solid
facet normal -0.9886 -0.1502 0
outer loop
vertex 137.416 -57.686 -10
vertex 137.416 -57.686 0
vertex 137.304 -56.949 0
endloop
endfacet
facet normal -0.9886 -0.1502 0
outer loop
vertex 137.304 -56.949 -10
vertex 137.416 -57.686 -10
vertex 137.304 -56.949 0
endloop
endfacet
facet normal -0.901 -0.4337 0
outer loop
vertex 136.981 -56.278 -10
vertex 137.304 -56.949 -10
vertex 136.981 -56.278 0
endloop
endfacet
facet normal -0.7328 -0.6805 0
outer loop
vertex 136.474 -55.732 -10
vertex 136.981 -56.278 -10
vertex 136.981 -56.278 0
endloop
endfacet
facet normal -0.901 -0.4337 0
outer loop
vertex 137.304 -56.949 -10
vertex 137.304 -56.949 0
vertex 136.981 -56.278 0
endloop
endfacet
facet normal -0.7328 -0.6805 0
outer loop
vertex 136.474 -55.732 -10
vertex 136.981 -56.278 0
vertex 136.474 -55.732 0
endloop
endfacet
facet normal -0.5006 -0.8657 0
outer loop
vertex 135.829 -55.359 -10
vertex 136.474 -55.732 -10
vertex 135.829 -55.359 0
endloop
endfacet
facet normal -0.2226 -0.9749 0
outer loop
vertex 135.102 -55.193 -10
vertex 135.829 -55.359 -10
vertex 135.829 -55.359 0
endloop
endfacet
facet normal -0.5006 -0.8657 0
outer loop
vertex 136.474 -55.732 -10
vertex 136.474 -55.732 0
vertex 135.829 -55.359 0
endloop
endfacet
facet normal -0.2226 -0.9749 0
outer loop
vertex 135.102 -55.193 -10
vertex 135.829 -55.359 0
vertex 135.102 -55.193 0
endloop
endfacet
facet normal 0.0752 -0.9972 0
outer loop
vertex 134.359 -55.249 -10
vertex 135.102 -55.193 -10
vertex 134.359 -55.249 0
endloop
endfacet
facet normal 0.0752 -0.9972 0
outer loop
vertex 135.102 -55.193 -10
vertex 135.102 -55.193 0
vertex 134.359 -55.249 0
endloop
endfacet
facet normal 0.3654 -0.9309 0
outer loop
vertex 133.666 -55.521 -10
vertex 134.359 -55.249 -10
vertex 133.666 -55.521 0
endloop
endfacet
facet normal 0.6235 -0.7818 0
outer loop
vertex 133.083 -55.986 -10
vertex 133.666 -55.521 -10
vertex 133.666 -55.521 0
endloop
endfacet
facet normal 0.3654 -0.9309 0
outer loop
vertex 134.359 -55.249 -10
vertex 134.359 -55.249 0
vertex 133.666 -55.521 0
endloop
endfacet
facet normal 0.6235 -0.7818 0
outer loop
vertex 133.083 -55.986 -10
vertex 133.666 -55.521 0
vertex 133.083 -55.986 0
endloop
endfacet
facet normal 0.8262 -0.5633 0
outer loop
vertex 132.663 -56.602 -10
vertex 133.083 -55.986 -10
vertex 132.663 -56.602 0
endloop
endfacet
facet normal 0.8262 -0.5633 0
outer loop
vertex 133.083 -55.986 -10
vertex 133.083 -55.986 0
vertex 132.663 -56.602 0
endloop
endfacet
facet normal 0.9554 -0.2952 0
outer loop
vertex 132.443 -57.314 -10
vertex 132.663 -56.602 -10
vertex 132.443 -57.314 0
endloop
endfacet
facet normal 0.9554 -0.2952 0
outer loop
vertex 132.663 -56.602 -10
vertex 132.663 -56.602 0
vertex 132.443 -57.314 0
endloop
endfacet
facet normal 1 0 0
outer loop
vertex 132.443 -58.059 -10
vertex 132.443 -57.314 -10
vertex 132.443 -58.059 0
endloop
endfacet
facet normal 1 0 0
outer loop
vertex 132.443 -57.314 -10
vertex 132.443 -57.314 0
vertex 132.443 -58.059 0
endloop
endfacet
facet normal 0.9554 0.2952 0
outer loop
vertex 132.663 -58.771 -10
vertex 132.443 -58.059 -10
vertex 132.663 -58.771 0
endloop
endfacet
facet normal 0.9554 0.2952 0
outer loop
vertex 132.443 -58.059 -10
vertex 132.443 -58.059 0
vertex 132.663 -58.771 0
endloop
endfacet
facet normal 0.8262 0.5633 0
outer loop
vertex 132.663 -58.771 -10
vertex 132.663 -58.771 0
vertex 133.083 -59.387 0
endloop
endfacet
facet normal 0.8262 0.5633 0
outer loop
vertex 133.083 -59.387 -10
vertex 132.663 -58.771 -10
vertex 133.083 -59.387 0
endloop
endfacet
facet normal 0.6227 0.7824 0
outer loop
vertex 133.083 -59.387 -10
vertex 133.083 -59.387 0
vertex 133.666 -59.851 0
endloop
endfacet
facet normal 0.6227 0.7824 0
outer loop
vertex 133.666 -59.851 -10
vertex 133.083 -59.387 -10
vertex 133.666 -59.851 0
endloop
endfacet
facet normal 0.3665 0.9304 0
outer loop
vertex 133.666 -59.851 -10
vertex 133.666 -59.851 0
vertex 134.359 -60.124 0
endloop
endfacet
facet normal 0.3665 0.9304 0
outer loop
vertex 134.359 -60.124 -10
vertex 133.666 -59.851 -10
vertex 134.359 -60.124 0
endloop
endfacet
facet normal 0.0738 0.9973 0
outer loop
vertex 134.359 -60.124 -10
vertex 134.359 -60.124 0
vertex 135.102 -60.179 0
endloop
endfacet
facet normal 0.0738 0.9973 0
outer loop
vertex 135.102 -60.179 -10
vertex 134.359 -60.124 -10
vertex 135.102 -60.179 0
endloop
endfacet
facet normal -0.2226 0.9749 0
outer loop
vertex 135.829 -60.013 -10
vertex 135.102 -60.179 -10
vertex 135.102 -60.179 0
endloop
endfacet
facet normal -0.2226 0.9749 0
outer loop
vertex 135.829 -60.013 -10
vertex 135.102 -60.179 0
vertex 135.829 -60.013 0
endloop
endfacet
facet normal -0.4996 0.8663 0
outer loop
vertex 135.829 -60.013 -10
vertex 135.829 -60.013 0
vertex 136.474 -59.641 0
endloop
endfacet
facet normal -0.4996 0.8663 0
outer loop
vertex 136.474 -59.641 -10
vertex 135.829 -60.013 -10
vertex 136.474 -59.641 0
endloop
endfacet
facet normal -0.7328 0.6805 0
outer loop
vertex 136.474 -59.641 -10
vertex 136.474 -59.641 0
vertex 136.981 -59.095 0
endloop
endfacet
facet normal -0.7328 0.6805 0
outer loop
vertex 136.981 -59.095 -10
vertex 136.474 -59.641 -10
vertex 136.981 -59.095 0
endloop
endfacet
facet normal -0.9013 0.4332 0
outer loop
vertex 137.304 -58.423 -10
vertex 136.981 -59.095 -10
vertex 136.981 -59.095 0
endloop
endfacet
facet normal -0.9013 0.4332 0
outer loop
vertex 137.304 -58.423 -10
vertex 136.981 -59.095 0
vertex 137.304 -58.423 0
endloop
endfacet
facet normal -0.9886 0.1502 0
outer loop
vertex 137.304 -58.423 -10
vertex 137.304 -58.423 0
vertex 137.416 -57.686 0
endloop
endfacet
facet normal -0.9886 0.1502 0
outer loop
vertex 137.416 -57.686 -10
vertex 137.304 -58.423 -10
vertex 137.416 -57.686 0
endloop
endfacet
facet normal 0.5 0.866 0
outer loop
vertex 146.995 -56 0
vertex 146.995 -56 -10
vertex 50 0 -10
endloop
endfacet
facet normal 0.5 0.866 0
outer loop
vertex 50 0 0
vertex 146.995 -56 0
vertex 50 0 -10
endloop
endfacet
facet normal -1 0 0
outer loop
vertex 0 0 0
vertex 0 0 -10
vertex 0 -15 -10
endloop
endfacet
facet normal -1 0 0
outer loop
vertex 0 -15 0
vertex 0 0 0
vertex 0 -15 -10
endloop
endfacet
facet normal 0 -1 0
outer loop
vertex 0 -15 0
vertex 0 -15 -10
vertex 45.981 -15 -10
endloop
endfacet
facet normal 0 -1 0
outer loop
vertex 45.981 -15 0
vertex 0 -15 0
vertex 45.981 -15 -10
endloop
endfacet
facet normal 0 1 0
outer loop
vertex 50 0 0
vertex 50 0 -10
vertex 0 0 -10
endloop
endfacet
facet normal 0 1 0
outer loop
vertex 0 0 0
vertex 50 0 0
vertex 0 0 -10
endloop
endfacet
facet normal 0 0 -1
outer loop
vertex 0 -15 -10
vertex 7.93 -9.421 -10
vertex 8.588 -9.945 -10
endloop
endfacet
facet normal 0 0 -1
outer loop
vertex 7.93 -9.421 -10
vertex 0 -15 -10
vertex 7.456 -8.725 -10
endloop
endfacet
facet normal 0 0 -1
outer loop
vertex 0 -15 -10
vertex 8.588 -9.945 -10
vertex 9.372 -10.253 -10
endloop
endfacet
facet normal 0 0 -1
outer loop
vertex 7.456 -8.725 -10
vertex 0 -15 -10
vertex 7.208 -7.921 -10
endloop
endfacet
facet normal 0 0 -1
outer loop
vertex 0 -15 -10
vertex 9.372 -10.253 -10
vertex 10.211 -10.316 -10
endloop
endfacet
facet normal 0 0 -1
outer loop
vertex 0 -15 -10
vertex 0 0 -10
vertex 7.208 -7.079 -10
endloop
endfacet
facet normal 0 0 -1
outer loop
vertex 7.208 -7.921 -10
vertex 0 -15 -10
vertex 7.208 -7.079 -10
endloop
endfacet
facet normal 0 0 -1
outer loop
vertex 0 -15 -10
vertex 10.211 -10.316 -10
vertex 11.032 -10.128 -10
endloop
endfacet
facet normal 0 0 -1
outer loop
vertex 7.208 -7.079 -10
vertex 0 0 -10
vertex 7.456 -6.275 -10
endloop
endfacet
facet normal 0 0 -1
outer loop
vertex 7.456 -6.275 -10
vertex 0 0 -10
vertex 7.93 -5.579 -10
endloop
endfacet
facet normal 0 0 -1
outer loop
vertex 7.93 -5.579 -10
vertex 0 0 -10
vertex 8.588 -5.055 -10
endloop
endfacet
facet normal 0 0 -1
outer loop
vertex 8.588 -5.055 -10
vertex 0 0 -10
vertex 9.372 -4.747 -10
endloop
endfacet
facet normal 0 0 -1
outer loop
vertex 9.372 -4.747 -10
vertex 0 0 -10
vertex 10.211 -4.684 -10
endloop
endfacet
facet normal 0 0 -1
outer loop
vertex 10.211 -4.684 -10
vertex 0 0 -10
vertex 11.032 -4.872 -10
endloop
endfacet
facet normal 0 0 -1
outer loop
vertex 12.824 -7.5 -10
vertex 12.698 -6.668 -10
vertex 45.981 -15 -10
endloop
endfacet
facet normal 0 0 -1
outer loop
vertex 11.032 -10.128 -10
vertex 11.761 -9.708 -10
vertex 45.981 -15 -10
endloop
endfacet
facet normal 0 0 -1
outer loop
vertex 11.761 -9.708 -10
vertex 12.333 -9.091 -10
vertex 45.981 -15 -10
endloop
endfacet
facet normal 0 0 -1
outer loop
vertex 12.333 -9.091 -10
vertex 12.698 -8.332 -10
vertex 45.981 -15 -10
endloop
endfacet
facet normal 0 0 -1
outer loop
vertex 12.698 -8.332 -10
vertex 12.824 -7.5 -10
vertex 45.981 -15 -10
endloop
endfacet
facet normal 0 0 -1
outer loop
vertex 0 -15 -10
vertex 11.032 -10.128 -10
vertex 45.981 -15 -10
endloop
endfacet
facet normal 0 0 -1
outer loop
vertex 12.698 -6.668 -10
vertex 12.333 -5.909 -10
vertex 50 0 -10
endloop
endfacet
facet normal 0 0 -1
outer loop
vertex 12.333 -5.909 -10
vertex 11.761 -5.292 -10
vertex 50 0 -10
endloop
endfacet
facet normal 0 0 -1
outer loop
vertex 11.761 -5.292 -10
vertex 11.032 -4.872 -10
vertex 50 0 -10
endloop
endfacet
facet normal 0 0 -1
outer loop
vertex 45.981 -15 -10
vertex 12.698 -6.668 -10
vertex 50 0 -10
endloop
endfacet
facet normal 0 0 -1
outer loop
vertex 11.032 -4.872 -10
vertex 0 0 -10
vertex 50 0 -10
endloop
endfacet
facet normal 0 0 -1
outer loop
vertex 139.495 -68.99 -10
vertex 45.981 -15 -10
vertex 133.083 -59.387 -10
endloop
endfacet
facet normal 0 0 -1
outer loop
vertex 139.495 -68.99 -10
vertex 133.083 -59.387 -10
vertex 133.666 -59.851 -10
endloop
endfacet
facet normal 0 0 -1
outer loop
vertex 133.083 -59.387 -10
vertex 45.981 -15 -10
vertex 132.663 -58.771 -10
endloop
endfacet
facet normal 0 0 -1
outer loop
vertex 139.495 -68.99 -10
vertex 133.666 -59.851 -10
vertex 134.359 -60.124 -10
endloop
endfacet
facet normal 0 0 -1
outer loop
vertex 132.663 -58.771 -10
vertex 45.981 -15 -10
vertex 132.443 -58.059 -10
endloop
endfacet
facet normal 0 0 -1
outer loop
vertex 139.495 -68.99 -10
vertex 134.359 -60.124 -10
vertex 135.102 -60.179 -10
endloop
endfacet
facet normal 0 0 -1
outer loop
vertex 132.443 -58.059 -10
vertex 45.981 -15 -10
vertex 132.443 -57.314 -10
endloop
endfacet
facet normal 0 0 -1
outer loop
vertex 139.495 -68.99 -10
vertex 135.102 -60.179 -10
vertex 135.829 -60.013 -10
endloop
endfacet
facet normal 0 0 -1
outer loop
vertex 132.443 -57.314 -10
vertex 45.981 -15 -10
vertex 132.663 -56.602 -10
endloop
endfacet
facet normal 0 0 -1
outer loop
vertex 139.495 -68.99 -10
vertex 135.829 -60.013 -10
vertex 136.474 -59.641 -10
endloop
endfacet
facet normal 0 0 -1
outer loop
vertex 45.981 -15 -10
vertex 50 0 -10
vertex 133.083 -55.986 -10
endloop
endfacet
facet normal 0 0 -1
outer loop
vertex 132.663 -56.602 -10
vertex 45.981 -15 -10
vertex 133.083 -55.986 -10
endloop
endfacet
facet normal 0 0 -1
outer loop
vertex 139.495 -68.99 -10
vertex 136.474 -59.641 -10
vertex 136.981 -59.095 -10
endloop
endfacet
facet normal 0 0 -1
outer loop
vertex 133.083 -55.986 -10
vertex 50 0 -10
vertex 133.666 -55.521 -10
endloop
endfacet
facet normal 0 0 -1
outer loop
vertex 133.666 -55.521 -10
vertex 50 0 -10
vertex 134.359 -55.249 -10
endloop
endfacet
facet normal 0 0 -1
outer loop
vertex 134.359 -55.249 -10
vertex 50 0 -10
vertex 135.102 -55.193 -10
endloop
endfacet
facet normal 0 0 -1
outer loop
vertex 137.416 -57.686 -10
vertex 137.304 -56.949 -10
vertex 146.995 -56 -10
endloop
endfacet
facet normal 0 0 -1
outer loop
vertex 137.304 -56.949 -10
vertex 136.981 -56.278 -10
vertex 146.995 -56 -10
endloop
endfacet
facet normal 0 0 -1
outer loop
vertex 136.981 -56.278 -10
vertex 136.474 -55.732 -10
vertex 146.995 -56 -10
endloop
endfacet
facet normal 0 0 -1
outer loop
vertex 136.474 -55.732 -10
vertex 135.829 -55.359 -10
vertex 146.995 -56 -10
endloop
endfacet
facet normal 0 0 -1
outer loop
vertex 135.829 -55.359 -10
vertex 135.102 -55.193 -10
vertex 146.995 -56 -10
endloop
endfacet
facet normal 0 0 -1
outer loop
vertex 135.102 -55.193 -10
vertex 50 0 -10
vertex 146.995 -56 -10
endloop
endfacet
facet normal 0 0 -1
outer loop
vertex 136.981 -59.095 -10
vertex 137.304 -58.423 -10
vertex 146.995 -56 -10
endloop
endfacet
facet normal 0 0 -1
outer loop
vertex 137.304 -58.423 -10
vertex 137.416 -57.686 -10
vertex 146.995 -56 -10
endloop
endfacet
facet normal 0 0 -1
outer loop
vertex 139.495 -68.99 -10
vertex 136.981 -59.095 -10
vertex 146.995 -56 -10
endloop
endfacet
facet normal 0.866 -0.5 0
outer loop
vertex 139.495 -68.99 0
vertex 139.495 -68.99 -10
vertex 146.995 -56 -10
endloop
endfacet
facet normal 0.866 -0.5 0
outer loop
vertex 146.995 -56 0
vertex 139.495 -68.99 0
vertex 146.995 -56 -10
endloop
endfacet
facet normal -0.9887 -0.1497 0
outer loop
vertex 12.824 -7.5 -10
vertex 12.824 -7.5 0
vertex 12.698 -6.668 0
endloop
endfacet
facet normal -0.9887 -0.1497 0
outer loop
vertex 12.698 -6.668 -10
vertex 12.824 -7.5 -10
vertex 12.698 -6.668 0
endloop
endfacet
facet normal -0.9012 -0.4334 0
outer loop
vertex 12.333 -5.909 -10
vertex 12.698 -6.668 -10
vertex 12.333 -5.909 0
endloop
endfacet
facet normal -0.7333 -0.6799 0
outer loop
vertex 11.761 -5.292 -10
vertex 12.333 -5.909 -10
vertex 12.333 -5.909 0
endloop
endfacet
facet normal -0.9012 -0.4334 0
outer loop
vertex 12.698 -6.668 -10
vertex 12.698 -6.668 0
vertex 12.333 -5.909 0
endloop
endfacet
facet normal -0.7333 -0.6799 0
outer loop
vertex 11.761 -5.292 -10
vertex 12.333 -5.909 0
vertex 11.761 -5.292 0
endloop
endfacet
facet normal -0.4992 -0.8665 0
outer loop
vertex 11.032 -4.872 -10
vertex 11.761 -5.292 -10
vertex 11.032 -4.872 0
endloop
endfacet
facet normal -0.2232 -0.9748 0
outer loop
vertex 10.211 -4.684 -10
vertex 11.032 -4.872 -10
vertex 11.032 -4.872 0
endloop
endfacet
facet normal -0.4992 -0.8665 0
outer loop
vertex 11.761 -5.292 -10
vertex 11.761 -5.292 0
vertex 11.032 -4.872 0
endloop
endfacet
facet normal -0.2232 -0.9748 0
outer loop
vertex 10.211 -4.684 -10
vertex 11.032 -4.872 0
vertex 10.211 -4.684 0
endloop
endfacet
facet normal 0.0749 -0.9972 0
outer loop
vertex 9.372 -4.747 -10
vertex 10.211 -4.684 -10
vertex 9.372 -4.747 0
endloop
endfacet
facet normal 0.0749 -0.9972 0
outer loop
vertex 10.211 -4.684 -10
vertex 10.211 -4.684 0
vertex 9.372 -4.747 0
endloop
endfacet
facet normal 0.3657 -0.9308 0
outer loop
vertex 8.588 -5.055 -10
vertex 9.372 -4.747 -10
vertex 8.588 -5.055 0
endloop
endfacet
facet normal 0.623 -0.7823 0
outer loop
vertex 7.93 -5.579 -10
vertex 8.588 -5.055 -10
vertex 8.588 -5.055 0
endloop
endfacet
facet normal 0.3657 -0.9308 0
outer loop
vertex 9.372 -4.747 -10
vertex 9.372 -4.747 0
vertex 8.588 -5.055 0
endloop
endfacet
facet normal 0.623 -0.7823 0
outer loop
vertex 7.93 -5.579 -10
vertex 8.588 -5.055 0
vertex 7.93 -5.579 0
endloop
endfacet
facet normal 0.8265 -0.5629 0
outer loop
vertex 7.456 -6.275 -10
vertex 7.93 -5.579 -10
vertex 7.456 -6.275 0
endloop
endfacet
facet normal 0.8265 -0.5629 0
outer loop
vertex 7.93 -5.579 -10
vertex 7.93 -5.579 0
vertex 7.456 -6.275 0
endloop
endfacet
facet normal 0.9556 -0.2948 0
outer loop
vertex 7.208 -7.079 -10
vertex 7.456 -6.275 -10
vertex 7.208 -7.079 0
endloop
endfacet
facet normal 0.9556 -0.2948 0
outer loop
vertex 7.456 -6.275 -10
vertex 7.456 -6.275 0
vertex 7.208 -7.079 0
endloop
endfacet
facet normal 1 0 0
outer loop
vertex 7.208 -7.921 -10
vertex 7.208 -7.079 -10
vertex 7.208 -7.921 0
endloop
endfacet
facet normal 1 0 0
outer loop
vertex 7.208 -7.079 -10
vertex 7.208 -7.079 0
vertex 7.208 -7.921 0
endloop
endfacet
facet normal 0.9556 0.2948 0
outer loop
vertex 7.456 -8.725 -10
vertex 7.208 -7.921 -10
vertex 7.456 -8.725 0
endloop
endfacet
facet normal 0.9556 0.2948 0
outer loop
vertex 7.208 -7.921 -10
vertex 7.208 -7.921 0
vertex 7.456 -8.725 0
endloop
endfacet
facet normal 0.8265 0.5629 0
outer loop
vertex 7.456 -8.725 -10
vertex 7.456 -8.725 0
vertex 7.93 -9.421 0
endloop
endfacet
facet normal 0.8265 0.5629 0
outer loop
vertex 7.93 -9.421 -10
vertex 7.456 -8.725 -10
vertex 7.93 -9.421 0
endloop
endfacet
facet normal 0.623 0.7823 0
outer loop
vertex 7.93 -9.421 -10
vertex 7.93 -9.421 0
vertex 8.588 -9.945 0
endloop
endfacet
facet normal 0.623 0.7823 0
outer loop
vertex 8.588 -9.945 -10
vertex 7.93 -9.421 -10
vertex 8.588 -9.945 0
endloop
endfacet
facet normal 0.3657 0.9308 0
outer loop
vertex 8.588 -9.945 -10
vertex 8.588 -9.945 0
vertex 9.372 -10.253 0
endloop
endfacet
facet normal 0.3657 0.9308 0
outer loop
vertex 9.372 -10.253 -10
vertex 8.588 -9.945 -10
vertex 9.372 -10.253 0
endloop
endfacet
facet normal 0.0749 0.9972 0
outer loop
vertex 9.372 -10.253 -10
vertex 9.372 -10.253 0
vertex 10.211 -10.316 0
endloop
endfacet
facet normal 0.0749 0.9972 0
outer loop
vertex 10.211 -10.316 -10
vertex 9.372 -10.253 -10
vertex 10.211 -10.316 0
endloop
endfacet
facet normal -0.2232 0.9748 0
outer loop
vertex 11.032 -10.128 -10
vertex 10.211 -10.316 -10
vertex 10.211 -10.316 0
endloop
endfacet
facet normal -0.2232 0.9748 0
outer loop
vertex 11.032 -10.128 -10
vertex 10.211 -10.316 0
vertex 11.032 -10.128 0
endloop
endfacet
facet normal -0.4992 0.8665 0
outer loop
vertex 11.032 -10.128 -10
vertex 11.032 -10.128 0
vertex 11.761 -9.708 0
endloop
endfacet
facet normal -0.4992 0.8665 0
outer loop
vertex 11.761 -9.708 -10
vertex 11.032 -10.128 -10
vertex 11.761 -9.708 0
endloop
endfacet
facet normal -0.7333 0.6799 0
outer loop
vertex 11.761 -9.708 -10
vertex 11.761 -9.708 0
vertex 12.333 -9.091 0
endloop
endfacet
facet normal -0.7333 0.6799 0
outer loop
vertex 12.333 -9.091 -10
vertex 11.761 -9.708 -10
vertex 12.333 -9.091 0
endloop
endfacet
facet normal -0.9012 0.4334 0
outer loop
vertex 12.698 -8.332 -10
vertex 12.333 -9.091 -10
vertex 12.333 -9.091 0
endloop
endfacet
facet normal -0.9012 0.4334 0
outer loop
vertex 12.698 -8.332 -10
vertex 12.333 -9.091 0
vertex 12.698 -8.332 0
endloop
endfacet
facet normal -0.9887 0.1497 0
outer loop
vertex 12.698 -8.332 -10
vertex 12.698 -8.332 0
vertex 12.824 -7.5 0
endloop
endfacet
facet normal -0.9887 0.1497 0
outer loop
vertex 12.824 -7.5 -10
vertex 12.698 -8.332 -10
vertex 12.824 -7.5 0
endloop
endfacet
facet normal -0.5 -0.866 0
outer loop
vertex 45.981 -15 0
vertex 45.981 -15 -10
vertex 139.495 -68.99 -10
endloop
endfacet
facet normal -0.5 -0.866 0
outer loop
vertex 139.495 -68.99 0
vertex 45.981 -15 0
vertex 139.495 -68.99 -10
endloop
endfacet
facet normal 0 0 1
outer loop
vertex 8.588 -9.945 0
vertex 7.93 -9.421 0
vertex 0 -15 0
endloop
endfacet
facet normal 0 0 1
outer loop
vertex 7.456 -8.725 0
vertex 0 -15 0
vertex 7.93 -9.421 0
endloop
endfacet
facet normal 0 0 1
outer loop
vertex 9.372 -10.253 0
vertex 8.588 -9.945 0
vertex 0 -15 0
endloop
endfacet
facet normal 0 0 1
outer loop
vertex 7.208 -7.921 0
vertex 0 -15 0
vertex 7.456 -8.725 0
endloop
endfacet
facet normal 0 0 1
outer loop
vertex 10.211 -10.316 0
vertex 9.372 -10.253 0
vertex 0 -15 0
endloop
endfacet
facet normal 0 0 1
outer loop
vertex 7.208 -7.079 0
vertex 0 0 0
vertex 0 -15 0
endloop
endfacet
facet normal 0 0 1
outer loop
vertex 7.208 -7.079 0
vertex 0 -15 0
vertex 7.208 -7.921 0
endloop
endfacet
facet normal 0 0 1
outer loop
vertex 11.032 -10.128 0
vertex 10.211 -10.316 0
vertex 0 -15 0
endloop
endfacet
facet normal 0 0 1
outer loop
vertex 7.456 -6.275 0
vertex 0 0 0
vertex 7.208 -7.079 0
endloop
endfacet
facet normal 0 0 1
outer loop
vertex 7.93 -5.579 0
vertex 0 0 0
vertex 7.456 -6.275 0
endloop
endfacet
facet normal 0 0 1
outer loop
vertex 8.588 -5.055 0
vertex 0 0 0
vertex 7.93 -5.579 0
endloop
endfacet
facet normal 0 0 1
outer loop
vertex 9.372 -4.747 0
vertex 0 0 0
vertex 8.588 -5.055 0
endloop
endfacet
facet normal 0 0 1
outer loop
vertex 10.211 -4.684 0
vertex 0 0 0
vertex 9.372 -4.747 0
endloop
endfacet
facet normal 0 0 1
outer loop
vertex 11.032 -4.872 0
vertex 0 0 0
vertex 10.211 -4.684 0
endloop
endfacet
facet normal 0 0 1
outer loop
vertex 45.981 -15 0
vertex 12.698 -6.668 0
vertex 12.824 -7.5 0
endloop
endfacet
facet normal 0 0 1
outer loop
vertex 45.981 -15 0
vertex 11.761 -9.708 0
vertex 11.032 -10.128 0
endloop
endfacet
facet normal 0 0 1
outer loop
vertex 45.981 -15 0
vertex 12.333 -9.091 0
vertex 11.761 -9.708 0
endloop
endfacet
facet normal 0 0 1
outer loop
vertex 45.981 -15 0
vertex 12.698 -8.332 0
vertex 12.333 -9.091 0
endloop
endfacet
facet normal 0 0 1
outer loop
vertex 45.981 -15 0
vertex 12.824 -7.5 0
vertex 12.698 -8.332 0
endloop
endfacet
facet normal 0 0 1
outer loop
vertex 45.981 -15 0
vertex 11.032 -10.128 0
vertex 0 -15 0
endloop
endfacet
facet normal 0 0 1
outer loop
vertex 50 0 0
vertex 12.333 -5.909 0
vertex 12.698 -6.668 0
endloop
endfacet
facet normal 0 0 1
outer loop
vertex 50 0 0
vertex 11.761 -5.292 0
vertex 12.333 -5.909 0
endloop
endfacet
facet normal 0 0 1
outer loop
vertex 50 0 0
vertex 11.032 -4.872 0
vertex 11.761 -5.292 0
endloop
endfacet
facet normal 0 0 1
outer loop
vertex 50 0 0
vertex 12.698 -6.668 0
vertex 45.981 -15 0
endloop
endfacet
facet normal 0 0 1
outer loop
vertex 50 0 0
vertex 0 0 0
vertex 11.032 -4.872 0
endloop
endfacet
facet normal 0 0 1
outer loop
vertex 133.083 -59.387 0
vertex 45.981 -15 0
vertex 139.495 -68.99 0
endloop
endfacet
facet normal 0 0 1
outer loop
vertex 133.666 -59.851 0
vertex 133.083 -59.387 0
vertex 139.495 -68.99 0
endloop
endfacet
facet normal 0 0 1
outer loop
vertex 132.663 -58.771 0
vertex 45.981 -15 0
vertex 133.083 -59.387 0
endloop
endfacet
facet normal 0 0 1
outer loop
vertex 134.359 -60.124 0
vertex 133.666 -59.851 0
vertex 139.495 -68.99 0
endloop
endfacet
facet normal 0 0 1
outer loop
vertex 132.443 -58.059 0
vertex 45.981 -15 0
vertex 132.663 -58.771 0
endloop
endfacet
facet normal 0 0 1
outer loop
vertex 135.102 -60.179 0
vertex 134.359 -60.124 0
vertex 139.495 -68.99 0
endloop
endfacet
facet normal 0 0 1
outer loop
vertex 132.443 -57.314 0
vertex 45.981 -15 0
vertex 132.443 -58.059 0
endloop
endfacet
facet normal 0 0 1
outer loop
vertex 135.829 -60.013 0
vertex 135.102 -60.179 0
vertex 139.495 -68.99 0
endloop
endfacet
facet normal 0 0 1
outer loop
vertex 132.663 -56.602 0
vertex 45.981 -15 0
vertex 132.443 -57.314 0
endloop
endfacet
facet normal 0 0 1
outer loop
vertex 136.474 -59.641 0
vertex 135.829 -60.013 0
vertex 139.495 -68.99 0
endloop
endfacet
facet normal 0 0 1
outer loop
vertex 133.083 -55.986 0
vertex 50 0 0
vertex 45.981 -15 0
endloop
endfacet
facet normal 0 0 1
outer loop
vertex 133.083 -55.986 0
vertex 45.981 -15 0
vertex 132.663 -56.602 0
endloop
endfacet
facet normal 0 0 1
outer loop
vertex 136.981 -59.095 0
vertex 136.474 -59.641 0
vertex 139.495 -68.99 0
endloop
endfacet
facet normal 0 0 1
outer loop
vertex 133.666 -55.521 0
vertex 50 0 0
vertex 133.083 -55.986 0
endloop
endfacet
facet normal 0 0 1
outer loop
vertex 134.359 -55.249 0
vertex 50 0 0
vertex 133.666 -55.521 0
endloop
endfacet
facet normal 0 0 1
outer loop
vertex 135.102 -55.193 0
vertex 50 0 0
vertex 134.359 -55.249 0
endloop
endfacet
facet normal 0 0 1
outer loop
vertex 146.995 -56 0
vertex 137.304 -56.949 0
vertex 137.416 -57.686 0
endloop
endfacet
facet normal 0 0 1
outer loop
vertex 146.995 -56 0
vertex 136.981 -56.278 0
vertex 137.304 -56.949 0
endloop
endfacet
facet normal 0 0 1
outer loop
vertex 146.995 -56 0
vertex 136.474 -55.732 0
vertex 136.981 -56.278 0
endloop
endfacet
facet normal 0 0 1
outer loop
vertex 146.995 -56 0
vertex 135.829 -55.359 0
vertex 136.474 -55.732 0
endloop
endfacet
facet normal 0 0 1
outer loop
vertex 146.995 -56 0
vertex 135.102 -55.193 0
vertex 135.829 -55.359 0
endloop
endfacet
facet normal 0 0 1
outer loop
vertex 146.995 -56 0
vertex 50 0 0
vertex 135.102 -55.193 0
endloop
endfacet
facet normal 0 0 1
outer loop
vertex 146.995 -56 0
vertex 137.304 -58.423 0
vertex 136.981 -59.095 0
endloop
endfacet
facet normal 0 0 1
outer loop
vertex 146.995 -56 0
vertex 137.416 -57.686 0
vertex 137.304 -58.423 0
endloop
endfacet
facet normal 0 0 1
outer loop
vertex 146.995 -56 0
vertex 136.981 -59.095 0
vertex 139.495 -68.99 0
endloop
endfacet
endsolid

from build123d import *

# Parameters (mm, degrees)
BASE_FLANGE1_START = -10
BASE_FLANGE1_DEPTH = 10
CUT_EXTRUDE1_REACH = 164.687
SKETCH6_R          = 2.823671173
SKETCH6_R_2        = 2.5


# Read off the part's stored shape, not the designer's step: Base-Flange1
with BuildPart() as part:
    # Base-Flange1 outline → Base-Flange1 (new body)
    with BuildSketch(Plane.XY.offset(BASE_FLANGE1_START)):
        Polygon((50, 0), (0, 0), (0, -15), (45.980762114, -15), (139.494845224, -68.990381057), (146.994845224, -56), align=None)
    extrude(amount=BASE_FLANGE1_DEPTH)

    # Sketch6 → Cut-Extrude1 (cut, up to next)
    with BuildSketch(Plane.XY, mode=Mode.PRIVATE) as cut_extrude1_sk1:
        with Locations((10, -7.5)):
            Circle(SKETCH6_R)
    cut_extrude1_tool1 = extrude(cut_extrude1_sk1.sketch, amount=-CUT_EXTRUDE1_REACH, mode=Mode.PRIVATE) & part.part
    # Sketch6 → Cut-Extrude1 (cut, up to next)
    with BuildSketch(Plane.XY, mode=Mode.PRIVATE) as cut_extrude1_sk2:
        with Locations((134.915511346, -57.686247372)):
            Circle(SKETCH6_R_2)
    cut_extrude1_tool2 = extrude(cut_extrude1_sk2.sketch, amount=-CUT_EXTRUDE1_REACH, mode=Mode.PRIVATE) & part.part
    add(cut_extrude1_tool1.solids().sort_by_distance((10, -7.5, 0))[0], mode=Mode.SUBTRACT)
    add(cut_extrude1_tool2.solids().sort_by_distance((134.915511, -57.686247, 0))[0], mode=Mode.SUBTRACT)


solid = part.part
